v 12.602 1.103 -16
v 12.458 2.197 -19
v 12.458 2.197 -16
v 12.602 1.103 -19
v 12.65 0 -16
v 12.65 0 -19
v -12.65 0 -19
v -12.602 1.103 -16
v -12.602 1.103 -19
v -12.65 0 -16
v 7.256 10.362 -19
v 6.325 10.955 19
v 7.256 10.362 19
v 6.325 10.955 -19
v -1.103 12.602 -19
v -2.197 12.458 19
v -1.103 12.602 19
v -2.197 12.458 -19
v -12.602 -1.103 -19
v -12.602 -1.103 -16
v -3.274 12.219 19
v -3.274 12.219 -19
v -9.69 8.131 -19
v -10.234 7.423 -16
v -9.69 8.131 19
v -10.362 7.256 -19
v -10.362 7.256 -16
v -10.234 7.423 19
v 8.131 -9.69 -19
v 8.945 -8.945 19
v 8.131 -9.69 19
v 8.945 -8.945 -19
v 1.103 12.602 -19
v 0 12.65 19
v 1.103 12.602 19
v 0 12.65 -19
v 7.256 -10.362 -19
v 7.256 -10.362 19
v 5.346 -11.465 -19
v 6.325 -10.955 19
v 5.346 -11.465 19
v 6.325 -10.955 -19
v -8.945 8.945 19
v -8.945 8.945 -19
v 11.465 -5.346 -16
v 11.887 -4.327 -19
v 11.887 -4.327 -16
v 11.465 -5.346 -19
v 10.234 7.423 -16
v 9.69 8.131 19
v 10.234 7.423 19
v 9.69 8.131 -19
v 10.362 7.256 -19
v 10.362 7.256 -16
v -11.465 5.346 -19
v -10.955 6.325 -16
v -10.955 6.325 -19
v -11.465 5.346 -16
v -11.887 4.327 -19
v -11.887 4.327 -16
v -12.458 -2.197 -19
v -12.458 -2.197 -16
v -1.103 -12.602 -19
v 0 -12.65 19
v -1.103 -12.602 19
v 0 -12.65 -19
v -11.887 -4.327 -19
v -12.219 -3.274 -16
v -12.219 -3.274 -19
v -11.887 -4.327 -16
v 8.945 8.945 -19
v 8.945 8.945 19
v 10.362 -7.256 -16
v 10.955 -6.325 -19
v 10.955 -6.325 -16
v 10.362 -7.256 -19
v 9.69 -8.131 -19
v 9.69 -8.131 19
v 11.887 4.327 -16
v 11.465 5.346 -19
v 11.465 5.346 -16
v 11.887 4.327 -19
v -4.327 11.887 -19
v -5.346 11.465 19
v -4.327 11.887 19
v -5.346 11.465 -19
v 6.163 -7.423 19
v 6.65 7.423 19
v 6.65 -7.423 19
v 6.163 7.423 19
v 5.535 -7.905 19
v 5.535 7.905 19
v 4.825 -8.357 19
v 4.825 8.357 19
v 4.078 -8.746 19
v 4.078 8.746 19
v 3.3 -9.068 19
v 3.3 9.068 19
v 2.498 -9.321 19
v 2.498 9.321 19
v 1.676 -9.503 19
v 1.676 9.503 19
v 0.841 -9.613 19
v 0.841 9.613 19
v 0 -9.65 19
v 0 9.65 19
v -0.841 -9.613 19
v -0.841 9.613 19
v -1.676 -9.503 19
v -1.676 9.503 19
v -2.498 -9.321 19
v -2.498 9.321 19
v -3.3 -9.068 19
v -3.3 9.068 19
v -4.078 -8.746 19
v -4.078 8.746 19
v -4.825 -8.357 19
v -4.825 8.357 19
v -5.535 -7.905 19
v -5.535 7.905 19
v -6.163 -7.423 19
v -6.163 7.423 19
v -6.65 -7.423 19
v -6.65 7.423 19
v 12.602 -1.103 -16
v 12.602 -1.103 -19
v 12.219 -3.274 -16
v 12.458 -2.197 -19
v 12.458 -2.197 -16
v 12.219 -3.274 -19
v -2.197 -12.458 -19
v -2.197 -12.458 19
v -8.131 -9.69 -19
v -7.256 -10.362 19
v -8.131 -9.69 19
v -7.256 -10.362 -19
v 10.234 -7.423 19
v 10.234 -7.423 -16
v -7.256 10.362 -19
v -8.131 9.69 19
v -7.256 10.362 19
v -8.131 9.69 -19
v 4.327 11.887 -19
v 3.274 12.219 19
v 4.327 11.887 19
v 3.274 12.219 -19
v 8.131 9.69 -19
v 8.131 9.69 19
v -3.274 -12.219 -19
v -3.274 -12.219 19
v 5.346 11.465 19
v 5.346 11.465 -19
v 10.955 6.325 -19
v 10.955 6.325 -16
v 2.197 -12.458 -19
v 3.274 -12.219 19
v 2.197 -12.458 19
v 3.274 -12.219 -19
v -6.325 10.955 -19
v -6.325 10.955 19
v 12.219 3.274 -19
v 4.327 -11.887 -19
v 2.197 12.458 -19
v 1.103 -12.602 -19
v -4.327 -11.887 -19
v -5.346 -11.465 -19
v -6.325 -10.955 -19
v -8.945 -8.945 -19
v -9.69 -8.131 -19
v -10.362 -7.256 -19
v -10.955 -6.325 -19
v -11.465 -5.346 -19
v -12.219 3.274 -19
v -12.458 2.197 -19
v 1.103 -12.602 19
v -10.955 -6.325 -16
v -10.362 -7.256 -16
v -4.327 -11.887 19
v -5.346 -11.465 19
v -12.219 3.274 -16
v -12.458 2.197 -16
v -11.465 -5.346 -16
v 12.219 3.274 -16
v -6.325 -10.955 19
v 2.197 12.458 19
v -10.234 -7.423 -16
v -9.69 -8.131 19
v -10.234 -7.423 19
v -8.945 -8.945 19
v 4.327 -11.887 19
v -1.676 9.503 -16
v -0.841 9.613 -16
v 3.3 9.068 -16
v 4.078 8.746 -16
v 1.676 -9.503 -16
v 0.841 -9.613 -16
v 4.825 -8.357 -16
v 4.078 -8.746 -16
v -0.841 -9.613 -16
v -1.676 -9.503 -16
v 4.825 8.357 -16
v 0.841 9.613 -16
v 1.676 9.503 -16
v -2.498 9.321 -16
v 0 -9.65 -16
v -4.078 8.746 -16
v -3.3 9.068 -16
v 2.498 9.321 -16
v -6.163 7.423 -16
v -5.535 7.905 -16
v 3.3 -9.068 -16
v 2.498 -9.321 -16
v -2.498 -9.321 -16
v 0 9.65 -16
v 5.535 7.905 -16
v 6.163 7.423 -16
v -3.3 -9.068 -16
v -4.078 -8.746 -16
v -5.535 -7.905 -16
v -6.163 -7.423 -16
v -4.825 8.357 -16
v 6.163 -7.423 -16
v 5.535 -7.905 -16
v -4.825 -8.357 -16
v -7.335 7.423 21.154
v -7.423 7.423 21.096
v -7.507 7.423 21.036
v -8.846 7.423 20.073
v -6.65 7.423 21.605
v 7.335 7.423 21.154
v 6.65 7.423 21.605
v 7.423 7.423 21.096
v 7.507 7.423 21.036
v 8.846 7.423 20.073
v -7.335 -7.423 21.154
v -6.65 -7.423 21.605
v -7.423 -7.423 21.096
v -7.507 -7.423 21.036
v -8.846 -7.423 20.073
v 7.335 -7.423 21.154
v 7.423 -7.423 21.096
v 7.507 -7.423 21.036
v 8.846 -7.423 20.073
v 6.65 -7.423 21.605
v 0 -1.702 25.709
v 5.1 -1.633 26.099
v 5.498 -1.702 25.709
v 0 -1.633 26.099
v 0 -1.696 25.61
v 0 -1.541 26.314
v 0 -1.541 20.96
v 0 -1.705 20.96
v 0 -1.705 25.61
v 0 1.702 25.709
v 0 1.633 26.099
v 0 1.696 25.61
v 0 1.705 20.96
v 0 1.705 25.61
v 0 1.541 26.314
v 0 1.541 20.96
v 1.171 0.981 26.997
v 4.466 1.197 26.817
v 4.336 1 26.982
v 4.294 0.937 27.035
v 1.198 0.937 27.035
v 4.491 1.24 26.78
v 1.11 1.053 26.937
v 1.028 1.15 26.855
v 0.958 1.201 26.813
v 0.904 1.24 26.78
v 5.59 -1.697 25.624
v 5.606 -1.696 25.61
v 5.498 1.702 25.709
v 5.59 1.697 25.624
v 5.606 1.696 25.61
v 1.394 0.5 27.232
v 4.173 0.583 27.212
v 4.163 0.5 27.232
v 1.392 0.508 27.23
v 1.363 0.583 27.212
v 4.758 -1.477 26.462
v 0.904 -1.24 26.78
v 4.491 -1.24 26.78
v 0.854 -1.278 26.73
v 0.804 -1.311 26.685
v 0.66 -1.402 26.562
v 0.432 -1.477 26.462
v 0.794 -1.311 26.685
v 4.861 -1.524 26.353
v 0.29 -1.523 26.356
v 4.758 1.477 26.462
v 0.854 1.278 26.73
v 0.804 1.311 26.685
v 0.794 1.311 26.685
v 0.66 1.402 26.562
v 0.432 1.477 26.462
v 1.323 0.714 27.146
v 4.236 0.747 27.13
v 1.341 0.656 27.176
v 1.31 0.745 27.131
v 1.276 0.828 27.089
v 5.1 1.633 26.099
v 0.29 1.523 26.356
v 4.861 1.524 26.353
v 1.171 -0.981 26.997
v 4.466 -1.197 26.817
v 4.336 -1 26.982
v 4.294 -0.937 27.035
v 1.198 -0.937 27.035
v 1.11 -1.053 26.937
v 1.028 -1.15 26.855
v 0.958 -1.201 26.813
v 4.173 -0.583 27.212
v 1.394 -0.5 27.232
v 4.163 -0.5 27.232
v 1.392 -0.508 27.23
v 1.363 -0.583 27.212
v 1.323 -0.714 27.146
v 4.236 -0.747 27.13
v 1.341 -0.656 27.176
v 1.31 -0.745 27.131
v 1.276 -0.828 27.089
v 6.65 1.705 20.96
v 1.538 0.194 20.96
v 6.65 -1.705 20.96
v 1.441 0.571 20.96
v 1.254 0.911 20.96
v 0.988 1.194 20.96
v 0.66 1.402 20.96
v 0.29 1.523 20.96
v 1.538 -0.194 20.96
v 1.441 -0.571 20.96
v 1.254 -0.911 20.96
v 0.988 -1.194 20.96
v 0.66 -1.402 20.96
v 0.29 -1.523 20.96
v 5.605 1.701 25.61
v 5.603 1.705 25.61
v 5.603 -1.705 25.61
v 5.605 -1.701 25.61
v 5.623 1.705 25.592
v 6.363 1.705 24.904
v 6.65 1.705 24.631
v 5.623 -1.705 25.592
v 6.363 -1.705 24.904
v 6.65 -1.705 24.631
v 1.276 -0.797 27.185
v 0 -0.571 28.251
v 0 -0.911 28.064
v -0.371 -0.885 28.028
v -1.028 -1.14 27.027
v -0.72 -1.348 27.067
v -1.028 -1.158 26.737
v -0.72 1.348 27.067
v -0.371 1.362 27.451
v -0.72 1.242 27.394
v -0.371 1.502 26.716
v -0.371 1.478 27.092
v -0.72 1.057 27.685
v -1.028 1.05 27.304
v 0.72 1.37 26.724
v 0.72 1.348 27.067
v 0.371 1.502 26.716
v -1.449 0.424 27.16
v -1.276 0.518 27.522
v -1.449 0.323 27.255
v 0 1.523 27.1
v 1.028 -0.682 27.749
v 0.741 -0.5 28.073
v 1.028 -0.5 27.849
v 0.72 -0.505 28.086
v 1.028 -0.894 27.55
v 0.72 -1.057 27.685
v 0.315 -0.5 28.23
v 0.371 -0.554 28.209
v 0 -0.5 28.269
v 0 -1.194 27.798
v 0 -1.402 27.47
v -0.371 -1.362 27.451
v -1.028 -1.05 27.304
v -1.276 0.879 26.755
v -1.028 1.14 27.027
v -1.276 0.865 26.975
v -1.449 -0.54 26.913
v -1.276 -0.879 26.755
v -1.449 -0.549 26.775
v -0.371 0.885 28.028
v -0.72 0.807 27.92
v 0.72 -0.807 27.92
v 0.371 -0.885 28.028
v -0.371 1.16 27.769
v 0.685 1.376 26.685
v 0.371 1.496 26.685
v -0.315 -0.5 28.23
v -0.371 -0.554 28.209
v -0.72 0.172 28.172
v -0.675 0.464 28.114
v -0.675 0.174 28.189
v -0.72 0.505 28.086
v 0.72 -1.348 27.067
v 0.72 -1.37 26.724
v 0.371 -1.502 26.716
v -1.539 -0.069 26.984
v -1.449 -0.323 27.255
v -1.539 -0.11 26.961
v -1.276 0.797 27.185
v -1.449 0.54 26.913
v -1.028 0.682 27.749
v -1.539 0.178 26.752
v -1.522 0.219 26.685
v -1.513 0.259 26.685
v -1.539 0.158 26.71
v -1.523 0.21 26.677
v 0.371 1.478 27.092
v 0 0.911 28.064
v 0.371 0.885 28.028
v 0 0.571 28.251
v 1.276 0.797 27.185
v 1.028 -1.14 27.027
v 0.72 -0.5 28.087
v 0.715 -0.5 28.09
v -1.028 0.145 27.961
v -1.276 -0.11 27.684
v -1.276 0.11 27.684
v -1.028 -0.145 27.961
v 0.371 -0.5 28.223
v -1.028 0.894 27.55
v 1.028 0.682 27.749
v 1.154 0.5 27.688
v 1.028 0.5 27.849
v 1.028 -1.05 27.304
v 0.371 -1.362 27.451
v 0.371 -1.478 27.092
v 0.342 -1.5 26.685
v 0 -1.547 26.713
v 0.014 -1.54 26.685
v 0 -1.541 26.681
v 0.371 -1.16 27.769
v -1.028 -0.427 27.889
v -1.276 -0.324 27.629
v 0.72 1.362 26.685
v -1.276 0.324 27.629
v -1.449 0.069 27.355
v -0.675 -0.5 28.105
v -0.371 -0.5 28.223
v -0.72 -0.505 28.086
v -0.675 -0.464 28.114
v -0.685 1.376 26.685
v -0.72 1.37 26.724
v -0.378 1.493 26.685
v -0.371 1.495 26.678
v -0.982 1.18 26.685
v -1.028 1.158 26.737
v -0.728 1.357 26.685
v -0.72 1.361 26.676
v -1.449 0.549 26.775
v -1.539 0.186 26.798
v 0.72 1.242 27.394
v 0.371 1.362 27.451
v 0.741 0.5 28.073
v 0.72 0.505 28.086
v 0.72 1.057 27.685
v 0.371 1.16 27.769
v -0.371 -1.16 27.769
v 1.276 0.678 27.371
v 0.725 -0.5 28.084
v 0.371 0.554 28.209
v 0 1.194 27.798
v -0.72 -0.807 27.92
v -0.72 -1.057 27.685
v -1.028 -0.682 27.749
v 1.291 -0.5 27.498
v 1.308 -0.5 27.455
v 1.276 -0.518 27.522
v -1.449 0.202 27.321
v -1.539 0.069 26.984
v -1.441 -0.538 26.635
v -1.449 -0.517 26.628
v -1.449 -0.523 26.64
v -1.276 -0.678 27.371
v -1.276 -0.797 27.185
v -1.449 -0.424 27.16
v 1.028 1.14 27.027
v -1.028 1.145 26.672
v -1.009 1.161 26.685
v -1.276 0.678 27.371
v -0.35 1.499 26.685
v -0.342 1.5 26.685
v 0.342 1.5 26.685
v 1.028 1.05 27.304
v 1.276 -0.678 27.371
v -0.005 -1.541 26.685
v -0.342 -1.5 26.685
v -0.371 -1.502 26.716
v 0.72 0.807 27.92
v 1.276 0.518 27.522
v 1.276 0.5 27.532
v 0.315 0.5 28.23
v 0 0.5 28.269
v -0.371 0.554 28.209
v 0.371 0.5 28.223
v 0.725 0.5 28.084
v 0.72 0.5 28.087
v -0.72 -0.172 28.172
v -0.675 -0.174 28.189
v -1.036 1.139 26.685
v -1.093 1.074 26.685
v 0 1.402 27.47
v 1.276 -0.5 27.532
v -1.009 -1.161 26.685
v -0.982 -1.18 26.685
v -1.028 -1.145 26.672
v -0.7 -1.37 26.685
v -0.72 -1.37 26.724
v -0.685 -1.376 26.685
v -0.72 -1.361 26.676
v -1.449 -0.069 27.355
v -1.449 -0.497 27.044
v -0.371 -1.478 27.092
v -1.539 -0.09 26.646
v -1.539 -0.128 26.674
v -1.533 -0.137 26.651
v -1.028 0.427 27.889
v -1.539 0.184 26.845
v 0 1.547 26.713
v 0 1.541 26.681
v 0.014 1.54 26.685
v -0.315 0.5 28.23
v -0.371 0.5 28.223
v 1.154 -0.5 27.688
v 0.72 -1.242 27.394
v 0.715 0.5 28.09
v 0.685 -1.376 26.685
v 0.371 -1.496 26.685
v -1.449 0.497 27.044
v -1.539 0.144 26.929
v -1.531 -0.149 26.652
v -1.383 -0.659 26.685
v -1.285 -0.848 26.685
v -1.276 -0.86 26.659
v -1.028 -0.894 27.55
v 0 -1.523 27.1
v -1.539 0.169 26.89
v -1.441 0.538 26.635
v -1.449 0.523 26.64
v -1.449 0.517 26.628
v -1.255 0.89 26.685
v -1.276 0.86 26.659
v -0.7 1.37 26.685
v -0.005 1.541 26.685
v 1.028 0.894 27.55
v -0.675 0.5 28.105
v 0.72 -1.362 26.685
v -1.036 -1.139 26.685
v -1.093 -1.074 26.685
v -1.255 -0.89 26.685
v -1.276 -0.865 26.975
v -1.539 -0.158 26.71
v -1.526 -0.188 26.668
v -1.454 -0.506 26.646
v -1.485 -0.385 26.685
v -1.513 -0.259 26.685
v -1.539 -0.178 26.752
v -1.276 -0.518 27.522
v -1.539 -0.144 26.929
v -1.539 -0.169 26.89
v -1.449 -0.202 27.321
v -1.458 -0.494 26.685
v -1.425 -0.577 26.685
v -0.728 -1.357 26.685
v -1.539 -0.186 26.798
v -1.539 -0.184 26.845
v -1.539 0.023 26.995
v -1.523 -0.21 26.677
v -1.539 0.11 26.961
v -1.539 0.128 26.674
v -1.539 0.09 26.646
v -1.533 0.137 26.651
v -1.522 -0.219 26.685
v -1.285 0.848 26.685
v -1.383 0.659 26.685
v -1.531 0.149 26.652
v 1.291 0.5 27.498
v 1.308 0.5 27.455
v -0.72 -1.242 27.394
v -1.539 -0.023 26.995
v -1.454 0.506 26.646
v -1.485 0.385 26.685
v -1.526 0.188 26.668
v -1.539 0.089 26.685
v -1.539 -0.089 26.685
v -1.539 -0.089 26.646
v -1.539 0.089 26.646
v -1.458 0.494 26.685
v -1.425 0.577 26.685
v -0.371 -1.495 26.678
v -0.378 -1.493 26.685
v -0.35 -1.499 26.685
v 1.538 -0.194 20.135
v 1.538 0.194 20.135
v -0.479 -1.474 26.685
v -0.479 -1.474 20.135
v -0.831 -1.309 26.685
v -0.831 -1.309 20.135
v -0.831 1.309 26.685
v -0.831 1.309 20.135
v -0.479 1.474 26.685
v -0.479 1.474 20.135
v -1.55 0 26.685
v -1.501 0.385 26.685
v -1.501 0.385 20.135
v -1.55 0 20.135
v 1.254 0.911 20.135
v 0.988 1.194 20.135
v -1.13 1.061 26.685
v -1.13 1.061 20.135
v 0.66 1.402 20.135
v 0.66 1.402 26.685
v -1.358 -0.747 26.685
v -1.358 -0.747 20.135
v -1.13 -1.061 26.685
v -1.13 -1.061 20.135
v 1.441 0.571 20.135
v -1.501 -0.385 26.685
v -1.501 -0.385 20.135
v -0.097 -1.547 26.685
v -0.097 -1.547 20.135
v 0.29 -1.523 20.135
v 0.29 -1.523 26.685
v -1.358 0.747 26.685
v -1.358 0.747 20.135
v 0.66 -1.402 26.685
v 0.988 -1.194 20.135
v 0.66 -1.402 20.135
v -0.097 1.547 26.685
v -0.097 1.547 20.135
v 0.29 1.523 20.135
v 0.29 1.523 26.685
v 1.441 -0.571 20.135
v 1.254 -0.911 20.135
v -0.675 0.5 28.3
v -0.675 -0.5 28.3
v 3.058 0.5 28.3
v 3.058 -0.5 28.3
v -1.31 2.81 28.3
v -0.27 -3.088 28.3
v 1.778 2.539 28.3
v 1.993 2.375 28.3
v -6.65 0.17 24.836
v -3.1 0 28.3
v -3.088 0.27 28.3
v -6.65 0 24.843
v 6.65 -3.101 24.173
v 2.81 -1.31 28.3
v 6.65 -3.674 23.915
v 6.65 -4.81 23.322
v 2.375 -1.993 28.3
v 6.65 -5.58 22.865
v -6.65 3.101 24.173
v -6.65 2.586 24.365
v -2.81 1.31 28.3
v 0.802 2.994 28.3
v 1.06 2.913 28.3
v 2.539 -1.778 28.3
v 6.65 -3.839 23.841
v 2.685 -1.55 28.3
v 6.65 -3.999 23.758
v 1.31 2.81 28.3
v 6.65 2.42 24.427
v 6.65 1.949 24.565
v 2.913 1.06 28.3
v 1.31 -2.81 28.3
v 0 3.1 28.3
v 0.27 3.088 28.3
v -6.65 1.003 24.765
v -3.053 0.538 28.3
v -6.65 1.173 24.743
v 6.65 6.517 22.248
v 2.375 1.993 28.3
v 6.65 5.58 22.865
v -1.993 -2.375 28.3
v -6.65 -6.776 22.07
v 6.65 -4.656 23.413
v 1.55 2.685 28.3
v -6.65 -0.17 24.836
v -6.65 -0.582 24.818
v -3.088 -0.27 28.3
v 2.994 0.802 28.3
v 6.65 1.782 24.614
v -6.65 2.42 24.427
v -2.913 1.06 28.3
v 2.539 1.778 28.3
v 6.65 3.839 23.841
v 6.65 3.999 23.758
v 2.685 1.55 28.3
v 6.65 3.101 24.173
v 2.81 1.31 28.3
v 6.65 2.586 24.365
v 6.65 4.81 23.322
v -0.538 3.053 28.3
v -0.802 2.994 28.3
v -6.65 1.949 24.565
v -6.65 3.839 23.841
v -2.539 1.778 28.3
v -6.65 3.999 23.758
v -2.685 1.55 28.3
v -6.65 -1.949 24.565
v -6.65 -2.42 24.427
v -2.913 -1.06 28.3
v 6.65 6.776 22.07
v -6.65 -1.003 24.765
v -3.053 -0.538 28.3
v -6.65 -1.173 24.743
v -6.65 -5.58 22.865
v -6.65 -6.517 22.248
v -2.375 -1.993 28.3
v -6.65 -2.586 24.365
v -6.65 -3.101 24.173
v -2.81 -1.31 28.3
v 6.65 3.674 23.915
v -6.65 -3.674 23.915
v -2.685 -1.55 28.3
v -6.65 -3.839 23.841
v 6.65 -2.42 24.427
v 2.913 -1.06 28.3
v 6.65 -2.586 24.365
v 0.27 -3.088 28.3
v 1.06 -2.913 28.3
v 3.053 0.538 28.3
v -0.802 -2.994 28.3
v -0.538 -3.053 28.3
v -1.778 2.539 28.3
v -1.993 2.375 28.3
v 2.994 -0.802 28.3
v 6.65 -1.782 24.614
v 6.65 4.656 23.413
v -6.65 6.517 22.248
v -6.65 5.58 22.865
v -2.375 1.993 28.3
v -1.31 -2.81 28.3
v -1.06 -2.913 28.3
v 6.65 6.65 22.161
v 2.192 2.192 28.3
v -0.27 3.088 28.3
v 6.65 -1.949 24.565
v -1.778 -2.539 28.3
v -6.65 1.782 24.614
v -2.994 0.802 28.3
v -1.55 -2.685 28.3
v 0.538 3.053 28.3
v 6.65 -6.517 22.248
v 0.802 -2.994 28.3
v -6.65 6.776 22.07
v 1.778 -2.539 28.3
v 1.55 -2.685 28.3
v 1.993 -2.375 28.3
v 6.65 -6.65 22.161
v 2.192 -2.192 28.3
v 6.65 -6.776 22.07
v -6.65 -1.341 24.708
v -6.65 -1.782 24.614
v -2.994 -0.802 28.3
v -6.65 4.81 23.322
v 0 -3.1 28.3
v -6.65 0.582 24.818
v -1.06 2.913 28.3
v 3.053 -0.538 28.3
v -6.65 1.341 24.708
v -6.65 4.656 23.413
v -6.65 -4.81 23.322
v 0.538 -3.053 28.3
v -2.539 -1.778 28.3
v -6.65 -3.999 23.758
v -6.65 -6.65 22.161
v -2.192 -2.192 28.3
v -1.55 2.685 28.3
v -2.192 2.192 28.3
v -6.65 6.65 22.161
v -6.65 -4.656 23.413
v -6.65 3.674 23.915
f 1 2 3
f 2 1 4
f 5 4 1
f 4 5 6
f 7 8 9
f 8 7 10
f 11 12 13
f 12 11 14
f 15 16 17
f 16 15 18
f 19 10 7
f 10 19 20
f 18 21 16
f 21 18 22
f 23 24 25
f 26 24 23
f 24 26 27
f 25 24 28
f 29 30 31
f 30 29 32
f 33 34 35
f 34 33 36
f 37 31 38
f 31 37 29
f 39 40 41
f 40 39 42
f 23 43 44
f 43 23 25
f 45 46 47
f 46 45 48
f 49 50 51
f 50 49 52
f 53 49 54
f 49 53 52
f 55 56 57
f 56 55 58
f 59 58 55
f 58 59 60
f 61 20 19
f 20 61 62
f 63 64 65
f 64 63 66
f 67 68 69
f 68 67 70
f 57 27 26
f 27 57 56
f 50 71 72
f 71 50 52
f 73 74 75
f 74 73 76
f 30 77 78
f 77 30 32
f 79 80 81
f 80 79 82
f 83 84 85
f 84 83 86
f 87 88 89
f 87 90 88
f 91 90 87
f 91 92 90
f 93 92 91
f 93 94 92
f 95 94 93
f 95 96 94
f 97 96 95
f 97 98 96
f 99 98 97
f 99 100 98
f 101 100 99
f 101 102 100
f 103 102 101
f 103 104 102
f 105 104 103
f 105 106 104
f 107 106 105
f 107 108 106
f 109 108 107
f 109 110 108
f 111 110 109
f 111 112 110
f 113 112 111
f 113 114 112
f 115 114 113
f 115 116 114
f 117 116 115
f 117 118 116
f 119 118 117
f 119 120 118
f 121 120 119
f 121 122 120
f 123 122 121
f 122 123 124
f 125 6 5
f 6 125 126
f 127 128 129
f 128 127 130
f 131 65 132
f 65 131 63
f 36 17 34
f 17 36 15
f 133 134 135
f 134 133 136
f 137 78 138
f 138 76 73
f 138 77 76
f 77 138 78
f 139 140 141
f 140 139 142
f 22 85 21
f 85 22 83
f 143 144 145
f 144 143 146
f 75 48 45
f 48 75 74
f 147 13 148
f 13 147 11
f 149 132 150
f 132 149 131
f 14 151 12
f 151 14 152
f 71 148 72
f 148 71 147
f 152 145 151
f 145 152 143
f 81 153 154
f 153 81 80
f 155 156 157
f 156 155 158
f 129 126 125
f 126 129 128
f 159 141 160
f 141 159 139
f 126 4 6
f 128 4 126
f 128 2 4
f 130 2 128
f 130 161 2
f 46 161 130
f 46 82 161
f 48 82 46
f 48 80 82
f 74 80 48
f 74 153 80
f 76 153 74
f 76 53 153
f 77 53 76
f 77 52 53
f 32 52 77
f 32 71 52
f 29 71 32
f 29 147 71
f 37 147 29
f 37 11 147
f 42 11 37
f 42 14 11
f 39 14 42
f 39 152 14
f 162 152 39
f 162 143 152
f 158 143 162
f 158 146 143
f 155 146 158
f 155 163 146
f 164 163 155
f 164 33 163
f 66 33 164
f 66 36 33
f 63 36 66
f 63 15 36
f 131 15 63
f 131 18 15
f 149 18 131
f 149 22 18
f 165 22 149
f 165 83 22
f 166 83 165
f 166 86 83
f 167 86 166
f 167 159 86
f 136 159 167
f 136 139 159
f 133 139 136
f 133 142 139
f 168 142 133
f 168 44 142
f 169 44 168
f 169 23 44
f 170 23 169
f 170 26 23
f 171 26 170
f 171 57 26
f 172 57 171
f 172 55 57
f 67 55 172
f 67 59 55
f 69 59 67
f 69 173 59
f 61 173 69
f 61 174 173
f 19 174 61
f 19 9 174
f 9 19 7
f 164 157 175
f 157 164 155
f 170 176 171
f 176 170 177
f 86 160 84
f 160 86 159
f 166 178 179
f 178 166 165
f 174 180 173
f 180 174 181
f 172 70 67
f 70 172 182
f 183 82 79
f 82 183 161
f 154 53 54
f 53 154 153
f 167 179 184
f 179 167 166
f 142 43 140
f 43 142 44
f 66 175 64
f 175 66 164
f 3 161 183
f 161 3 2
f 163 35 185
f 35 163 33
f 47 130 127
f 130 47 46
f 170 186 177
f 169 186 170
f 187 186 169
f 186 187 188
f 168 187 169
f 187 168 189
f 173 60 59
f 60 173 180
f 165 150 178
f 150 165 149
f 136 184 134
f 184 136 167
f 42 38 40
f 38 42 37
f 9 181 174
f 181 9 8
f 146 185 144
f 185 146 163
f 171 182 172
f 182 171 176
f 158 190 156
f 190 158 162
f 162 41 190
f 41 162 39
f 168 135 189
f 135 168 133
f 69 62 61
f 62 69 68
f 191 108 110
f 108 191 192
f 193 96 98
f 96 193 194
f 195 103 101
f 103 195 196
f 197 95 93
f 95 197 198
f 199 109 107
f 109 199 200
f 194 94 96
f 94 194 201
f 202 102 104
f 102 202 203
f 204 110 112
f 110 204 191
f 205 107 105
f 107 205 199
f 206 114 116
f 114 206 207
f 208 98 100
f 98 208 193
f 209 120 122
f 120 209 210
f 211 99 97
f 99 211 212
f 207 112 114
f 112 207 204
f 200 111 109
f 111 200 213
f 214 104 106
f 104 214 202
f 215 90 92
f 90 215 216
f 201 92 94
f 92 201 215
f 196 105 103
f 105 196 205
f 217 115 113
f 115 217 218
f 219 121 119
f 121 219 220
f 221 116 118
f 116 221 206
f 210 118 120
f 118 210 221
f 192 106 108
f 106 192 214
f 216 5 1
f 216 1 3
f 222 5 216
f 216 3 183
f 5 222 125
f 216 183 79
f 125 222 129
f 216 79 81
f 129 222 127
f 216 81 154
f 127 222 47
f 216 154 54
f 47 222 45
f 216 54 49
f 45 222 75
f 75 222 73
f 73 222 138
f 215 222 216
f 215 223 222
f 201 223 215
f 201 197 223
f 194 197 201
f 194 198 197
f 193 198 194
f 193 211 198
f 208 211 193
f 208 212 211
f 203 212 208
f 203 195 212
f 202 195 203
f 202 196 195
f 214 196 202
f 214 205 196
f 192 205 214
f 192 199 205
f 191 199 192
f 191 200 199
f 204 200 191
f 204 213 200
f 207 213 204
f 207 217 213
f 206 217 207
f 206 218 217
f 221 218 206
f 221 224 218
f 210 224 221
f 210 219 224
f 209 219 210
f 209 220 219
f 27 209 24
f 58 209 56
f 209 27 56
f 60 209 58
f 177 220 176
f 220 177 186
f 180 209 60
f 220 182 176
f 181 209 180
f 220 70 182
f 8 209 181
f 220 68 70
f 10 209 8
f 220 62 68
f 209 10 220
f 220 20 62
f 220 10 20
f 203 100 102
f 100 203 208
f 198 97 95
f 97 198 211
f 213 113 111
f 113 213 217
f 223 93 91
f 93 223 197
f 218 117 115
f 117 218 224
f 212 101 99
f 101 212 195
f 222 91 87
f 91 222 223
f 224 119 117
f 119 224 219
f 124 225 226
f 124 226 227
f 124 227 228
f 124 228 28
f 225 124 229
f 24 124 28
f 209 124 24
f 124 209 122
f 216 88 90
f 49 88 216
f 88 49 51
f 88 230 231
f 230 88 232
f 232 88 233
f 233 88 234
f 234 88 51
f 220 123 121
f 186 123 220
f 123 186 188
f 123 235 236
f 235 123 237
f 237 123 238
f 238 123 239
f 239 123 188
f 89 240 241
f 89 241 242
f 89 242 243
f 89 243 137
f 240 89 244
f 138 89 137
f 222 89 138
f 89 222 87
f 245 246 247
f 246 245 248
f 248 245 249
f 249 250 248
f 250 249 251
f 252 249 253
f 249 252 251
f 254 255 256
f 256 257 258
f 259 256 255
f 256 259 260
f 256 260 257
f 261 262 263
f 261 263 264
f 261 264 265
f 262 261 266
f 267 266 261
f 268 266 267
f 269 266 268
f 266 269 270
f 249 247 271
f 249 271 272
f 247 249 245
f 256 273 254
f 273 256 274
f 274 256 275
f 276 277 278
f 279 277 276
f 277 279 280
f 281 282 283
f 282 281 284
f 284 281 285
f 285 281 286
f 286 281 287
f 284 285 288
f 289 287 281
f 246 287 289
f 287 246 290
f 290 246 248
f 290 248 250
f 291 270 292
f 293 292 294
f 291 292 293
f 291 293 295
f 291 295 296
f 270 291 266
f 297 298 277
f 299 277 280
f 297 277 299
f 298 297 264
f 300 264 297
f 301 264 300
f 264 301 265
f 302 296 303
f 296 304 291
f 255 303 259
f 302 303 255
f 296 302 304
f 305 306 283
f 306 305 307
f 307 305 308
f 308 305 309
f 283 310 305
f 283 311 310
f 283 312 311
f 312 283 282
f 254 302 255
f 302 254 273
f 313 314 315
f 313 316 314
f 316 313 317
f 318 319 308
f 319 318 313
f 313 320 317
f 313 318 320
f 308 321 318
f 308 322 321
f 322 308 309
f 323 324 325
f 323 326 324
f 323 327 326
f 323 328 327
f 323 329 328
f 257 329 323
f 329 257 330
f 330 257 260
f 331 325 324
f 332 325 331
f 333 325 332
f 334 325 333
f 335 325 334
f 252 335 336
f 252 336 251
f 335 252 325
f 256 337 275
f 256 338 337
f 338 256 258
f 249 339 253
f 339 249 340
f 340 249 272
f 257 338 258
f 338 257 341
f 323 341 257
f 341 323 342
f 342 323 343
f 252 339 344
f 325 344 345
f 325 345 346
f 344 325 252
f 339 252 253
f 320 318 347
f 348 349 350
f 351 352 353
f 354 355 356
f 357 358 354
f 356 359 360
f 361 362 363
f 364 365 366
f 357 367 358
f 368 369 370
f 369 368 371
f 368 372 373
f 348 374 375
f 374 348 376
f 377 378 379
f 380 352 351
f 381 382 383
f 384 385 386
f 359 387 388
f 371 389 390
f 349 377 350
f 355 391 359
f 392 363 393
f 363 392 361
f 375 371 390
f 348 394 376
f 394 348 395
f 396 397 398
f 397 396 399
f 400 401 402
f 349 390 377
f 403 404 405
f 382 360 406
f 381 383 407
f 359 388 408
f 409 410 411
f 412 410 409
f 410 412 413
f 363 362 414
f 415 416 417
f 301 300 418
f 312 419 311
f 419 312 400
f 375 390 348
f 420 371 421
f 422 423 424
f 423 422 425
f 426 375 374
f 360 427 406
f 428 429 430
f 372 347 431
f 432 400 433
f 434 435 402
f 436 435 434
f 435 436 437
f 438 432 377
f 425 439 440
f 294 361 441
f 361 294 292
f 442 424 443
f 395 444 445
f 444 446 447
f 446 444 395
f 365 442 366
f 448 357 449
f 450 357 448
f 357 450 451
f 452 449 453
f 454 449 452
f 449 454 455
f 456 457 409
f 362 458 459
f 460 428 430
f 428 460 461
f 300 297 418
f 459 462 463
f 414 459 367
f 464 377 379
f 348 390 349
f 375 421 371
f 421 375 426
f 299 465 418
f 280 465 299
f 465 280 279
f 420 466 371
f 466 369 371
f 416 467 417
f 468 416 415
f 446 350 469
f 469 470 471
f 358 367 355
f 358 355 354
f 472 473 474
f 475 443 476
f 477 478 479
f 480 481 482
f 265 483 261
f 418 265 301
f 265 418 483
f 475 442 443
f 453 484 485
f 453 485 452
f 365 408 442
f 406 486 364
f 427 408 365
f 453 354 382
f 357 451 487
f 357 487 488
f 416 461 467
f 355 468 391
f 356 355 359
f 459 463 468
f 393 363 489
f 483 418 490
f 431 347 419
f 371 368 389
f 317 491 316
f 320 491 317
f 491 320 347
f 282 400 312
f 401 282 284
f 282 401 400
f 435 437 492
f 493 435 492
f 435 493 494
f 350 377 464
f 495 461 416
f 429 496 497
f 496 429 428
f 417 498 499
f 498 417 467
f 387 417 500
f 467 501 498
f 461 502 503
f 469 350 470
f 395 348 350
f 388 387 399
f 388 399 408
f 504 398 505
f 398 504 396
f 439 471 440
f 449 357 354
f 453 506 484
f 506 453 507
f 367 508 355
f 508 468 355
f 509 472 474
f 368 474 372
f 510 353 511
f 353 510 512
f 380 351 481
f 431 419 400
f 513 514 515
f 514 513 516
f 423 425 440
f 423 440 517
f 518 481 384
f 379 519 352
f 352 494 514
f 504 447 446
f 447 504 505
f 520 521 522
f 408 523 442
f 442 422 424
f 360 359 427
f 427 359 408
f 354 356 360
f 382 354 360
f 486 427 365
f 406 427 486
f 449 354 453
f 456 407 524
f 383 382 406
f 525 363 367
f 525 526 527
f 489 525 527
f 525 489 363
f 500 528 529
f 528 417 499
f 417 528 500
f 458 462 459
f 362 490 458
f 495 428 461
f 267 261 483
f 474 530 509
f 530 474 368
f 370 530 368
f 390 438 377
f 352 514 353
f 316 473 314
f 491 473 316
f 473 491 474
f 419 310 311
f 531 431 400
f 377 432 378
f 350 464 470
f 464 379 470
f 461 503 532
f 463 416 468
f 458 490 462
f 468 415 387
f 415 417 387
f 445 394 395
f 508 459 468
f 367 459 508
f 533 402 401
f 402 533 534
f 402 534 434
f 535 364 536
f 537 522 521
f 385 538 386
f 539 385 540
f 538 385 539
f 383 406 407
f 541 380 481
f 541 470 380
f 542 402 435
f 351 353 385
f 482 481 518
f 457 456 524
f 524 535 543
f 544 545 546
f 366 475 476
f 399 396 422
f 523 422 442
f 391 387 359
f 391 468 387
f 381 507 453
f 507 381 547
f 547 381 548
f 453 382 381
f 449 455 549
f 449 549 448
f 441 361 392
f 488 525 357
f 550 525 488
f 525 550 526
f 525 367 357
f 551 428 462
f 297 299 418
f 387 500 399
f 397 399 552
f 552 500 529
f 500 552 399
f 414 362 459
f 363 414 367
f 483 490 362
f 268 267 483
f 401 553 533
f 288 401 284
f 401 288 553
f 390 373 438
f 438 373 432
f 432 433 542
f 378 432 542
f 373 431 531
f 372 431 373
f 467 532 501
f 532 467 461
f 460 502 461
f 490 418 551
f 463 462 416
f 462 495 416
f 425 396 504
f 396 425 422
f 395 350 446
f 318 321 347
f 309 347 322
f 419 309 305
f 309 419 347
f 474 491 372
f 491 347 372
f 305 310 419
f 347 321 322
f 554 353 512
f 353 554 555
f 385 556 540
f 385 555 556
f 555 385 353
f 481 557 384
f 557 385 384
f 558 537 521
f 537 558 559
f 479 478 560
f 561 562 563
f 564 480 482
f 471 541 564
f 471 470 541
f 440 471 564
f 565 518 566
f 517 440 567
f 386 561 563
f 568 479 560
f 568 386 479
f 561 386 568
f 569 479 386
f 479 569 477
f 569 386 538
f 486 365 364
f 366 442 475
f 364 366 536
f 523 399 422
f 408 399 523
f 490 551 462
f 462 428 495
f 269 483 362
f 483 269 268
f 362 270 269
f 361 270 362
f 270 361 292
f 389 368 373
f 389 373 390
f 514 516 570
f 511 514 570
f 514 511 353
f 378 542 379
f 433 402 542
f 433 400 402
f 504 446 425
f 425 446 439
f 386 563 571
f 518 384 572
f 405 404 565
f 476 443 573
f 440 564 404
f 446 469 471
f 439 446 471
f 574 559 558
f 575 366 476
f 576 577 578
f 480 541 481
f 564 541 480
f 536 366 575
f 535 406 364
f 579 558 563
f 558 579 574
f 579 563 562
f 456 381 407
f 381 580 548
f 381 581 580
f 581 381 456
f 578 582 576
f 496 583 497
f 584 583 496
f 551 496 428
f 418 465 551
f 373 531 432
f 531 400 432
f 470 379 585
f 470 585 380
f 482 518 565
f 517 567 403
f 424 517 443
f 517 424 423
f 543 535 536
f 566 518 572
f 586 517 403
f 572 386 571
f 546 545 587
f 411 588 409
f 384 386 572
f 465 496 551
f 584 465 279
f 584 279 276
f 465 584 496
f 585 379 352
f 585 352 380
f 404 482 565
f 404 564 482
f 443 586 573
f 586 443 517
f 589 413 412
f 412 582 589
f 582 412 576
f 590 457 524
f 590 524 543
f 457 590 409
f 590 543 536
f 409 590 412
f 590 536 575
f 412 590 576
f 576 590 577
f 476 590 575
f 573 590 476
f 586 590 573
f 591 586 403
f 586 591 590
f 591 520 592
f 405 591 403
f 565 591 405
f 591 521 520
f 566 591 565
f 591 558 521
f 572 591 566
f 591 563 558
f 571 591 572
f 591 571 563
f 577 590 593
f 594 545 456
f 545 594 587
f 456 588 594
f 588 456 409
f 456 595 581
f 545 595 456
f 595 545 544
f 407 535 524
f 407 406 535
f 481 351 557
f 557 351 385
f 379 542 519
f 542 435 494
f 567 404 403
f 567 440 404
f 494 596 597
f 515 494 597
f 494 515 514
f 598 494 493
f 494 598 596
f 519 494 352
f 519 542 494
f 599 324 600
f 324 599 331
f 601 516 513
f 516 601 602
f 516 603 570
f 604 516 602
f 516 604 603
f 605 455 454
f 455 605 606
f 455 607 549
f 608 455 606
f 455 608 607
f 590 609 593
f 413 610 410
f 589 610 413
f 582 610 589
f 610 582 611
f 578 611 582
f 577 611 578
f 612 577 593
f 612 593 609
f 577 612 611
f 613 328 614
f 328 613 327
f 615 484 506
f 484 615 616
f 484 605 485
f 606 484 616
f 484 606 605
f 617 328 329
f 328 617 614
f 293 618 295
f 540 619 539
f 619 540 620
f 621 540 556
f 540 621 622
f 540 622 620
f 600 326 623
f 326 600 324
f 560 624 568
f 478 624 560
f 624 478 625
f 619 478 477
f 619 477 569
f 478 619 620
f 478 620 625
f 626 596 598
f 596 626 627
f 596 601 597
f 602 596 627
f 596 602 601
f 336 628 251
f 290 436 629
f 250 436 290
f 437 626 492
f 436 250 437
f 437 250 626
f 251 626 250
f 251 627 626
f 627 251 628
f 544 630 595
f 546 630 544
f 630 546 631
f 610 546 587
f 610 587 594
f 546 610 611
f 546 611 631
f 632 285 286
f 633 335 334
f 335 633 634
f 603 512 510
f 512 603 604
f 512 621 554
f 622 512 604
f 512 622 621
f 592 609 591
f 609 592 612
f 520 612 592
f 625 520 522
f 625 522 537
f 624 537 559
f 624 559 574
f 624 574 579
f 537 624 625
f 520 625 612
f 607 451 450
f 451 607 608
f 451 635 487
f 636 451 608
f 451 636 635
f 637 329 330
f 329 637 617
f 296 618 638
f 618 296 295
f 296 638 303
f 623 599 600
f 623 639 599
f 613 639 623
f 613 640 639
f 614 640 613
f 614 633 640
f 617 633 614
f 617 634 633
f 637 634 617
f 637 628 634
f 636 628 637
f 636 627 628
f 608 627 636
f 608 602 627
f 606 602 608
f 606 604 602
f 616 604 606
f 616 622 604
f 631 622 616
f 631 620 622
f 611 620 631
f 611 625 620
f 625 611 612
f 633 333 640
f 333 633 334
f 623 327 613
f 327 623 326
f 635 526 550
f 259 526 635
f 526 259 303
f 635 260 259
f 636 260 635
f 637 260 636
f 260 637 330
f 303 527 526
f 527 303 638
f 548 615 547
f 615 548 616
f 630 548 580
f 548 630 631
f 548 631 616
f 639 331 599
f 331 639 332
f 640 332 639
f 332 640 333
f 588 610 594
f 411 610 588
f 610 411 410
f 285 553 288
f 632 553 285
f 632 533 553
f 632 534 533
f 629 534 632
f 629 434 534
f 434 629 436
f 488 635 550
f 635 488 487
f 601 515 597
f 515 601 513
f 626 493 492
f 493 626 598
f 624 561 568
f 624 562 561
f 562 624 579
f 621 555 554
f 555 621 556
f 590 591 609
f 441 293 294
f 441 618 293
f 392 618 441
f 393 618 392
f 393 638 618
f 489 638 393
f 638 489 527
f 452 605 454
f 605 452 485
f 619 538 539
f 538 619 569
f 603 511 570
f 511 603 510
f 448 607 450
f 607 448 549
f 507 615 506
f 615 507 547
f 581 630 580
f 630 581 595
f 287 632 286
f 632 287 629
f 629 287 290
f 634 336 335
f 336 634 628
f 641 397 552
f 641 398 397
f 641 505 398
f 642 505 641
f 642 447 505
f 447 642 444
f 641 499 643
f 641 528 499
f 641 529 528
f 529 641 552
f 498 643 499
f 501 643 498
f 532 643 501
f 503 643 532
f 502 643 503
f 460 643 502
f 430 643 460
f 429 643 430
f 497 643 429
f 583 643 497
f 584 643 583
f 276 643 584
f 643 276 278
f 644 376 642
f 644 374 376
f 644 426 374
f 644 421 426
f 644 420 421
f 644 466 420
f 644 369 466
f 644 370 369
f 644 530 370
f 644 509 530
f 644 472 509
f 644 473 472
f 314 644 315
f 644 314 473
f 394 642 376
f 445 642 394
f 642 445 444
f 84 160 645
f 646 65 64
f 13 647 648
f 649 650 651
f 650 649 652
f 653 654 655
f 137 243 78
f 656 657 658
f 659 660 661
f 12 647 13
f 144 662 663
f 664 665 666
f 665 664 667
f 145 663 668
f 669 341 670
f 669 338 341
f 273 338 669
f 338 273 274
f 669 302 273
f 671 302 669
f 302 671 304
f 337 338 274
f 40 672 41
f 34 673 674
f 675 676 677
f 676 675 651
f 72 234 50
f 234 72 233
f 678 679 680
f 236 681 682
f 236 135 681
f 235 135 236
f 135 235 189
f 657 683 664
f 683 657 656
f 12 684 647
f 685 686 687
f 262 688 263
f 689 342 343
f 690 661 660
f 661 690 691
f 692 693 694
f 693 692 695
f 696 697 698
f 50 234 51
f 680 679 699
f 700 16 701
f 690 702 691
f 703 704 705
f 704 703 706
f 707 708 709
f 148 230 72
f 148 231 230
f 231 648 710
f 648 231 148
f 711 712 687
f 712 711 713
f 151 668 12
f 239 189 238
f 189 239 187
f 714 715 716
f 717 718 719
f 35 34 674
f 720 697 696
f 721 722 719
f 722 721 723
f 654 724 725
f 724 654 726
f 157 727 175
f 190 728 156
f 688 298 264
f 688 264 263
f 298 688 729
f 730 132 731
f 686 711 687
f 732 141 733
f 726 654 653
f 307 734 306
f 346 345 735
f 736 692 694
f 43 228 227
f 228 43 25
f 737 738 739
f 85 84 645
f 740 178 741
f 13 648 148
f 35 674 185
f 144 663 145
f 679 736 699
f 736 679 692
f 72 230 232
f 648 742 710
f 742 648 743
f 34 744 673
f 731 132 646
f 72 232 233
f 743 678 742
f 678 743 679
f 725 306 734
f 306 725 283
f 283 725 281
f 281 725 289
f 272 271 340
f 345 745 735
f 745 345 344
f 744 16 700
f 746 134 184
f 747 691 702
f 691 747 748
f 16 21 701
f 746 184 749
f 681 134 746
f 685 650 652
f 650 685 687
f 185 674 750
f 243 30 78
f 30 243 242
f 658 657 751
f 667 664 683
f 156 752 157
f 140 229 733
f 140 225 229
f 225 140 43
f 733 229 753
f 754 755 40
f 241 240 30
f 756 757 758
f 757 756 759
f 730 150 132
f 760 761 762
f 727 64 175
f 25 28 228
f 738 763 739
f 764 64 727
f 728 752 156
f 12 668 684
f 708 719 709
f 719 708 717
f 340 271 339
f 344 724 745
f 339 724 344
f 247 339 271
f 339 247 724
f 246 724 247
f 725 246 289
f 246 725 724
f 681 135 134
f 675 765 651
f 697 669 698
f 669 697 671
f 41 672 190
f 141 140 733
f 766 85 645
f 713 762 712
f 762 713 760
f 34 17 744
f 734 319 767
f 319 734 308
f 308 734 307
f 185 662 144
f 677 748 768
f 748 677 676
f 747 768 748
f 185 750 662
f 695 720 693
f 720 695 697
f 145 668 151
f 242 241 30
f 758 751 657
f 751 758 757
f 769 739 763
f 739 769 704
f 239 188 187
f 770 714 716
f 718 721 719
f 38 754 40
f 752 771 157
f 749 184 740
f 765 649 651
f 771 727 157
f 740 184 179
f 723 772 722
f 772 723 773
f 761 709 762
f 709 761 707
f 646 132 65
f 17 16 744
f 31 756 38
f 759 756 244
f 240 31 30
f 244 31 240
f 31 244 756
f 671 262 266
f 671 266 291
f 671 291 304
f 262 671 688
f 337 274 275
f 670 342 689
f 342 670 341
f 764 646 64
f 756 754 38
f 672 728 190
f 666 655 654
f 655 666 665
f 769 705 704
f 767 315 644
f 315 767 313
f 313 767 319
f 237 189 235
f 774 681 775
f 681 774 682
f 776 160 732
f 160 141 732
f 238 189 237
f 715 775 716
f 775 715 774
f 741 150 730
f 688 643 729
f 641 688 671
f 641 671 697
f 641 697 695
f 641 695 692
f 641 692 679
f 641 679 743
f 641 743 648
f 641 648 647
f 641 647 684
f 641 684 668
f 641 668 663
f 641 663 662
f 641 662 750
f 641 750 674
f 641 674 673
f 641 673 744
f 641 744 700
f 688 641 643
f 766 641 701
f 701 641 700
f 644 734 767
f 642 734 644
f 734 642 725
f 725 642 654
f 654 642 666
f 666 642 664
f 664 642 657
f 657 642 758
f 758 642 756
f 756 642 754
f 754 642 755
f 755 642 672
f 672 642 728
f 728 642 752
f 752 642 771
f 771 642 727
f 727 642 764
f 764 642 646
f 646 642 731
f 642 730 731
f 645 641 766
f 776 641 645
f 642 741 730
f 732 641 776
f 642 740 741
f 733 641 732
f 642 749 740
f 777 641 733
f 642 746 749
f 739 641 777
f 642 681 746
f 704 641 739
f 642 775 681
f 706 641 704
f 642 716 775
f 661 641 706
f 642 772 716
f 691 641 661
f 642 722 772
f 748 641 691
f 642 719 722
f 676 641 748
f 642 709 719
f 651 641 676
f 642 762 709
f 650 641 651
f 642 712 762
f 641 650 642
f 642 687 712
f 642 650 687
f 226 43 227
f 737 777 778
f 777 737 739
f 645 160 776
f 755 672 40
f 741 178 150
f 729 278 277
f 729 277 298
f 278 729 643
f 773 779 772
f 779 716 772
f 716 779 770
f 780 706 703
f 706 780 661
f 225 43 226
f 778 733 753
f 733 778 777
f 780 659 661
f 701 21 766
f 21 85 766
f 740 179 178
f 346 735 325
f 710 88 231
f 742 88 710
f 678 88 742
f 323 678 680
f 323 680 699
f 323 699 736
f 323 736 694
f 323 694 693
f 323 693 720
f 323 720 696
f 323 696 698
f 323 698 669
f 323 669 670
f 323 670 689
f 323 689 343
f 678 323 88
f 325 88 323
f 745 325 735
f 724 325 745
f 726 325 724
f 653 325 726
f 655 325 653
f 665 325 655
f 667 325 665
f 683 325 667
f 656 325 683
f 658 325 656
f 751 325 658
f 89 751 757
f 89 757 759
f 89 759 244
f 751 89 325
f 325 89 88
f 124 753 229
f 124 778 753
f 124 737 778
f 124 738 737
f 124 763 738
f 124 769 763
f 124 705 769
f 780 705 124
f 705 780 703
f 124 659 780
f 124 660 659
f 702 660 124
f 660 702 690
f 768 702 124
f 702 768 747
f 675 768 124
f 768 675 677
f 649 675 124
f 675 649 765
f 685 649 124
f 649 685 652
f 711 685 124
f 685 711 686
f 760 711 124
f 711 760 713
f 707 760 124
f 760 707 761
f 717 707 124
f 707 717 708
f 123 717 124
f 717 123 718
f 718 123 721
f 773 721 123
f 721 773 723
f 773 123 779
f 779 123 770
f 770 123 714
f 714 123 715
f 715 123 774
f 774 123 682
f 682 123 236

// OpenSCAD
$fa = 5;
$fs = 0.4;

pennys_to_hold = 20;

holder_thickness = 3;

penny_diameter = 19.3;
penny_thickness = 1.6;

penny_shaft_height = penny_thickness*pennys_to_hold;

shell_radius = penny_diameter/2 + holder_thickness;

ball_diameter = 3.1;
ball_radius = ball_diameter/2;
ball_spacing = 4.3;
ball_segment_length = ball_spacing - ball_diameter;

top_height = ball_diameter * 3;

module pennyshaft(){
    translate([0,0,penny_thickness/2])
    cylinder(r=penny_diameter/2, h=penny_shaft_height + penny_thickness*2, center=true);
}

module holder_base(){
    cylinder(r=penny_diameter/2+holder_thickness, h=penny_thickness*pennys_to_hold+holder_thickness*2, center=true);
}

module view_cutout(){
    translate([0,0,holder_thickness/2+.5])
    cube(size=[penny_diameter + holder_thickness*2,penny_diameter/1.3,penny_thickness*pennys_to_hold+holder_thickness+1], center=true);
}

module top_cutout(){
    translate([penny_diameter,0,20])
    cube(size=[penny_diameter + holder_thickness*2,penny_diameter/1.3,penny_thickness*pennys_to_hold], center=true);
    translate([-penny_diameter,0,20])
    cube(size=[penny_diameter + holder_thickness*2,penny_diameter/1.3,penny_thickness*pennys_to_hold], center=true);
}

module penny_cutout(){
    cube(size=[penny_diameter,penny_diameter,penny_thickness], center=true);
}

module top(){
    difference(){
    translate([0,0,(penny_thickness*pennys_to_hold+holder_thickness*2)/2 + top_height/2])
    cylinder(r1=penny_diameter/2+holder_thickness,r2=ball_diameter, h=top_height, center=true);
    translate([(penny_diameter/2+holder_thickness)/2,0,(penny_thickness*pennys_to_hold+holder_thickness*2)/2 + top_height - ball_diameter/2 - (ball_spacing - ball_diameter)*.95])
    rotate([0,90,0])
        union(){
            cylinder(r=ball_diameter/2*1.1, h=penny_diameter/2+holder_thickness, center=true);
            translate([top_height/4,0,0])
            cube(size=[top_height/2,ball_diameter*1.1,penny_diameter/2+holder_thickness],center=true);
            translate([-ball_segment_length,0,-1/2 * (penny_diameter/2+holder_thickness)])
            sphere(r=ball_diameter/2,center=true);
            translate([(top_height - ball_diameter - ball_segment_length*1.5)/2,0,-shell_radius/2])
            rotate([0,90,0])
            cylinder(r=ball_diameter/2, h=top_height - ball_segment_length - ball_radius, center=true);
            cube(size=[9,1,14],center=true);
        }
    }
}
difference(){
    union(){
        difference(){
            holder_base();
            translate([0,0,penny_thickness/2])
            pennyshaft();
            view_cutout();
        }
        top();
    }
    top_cutout();
}
